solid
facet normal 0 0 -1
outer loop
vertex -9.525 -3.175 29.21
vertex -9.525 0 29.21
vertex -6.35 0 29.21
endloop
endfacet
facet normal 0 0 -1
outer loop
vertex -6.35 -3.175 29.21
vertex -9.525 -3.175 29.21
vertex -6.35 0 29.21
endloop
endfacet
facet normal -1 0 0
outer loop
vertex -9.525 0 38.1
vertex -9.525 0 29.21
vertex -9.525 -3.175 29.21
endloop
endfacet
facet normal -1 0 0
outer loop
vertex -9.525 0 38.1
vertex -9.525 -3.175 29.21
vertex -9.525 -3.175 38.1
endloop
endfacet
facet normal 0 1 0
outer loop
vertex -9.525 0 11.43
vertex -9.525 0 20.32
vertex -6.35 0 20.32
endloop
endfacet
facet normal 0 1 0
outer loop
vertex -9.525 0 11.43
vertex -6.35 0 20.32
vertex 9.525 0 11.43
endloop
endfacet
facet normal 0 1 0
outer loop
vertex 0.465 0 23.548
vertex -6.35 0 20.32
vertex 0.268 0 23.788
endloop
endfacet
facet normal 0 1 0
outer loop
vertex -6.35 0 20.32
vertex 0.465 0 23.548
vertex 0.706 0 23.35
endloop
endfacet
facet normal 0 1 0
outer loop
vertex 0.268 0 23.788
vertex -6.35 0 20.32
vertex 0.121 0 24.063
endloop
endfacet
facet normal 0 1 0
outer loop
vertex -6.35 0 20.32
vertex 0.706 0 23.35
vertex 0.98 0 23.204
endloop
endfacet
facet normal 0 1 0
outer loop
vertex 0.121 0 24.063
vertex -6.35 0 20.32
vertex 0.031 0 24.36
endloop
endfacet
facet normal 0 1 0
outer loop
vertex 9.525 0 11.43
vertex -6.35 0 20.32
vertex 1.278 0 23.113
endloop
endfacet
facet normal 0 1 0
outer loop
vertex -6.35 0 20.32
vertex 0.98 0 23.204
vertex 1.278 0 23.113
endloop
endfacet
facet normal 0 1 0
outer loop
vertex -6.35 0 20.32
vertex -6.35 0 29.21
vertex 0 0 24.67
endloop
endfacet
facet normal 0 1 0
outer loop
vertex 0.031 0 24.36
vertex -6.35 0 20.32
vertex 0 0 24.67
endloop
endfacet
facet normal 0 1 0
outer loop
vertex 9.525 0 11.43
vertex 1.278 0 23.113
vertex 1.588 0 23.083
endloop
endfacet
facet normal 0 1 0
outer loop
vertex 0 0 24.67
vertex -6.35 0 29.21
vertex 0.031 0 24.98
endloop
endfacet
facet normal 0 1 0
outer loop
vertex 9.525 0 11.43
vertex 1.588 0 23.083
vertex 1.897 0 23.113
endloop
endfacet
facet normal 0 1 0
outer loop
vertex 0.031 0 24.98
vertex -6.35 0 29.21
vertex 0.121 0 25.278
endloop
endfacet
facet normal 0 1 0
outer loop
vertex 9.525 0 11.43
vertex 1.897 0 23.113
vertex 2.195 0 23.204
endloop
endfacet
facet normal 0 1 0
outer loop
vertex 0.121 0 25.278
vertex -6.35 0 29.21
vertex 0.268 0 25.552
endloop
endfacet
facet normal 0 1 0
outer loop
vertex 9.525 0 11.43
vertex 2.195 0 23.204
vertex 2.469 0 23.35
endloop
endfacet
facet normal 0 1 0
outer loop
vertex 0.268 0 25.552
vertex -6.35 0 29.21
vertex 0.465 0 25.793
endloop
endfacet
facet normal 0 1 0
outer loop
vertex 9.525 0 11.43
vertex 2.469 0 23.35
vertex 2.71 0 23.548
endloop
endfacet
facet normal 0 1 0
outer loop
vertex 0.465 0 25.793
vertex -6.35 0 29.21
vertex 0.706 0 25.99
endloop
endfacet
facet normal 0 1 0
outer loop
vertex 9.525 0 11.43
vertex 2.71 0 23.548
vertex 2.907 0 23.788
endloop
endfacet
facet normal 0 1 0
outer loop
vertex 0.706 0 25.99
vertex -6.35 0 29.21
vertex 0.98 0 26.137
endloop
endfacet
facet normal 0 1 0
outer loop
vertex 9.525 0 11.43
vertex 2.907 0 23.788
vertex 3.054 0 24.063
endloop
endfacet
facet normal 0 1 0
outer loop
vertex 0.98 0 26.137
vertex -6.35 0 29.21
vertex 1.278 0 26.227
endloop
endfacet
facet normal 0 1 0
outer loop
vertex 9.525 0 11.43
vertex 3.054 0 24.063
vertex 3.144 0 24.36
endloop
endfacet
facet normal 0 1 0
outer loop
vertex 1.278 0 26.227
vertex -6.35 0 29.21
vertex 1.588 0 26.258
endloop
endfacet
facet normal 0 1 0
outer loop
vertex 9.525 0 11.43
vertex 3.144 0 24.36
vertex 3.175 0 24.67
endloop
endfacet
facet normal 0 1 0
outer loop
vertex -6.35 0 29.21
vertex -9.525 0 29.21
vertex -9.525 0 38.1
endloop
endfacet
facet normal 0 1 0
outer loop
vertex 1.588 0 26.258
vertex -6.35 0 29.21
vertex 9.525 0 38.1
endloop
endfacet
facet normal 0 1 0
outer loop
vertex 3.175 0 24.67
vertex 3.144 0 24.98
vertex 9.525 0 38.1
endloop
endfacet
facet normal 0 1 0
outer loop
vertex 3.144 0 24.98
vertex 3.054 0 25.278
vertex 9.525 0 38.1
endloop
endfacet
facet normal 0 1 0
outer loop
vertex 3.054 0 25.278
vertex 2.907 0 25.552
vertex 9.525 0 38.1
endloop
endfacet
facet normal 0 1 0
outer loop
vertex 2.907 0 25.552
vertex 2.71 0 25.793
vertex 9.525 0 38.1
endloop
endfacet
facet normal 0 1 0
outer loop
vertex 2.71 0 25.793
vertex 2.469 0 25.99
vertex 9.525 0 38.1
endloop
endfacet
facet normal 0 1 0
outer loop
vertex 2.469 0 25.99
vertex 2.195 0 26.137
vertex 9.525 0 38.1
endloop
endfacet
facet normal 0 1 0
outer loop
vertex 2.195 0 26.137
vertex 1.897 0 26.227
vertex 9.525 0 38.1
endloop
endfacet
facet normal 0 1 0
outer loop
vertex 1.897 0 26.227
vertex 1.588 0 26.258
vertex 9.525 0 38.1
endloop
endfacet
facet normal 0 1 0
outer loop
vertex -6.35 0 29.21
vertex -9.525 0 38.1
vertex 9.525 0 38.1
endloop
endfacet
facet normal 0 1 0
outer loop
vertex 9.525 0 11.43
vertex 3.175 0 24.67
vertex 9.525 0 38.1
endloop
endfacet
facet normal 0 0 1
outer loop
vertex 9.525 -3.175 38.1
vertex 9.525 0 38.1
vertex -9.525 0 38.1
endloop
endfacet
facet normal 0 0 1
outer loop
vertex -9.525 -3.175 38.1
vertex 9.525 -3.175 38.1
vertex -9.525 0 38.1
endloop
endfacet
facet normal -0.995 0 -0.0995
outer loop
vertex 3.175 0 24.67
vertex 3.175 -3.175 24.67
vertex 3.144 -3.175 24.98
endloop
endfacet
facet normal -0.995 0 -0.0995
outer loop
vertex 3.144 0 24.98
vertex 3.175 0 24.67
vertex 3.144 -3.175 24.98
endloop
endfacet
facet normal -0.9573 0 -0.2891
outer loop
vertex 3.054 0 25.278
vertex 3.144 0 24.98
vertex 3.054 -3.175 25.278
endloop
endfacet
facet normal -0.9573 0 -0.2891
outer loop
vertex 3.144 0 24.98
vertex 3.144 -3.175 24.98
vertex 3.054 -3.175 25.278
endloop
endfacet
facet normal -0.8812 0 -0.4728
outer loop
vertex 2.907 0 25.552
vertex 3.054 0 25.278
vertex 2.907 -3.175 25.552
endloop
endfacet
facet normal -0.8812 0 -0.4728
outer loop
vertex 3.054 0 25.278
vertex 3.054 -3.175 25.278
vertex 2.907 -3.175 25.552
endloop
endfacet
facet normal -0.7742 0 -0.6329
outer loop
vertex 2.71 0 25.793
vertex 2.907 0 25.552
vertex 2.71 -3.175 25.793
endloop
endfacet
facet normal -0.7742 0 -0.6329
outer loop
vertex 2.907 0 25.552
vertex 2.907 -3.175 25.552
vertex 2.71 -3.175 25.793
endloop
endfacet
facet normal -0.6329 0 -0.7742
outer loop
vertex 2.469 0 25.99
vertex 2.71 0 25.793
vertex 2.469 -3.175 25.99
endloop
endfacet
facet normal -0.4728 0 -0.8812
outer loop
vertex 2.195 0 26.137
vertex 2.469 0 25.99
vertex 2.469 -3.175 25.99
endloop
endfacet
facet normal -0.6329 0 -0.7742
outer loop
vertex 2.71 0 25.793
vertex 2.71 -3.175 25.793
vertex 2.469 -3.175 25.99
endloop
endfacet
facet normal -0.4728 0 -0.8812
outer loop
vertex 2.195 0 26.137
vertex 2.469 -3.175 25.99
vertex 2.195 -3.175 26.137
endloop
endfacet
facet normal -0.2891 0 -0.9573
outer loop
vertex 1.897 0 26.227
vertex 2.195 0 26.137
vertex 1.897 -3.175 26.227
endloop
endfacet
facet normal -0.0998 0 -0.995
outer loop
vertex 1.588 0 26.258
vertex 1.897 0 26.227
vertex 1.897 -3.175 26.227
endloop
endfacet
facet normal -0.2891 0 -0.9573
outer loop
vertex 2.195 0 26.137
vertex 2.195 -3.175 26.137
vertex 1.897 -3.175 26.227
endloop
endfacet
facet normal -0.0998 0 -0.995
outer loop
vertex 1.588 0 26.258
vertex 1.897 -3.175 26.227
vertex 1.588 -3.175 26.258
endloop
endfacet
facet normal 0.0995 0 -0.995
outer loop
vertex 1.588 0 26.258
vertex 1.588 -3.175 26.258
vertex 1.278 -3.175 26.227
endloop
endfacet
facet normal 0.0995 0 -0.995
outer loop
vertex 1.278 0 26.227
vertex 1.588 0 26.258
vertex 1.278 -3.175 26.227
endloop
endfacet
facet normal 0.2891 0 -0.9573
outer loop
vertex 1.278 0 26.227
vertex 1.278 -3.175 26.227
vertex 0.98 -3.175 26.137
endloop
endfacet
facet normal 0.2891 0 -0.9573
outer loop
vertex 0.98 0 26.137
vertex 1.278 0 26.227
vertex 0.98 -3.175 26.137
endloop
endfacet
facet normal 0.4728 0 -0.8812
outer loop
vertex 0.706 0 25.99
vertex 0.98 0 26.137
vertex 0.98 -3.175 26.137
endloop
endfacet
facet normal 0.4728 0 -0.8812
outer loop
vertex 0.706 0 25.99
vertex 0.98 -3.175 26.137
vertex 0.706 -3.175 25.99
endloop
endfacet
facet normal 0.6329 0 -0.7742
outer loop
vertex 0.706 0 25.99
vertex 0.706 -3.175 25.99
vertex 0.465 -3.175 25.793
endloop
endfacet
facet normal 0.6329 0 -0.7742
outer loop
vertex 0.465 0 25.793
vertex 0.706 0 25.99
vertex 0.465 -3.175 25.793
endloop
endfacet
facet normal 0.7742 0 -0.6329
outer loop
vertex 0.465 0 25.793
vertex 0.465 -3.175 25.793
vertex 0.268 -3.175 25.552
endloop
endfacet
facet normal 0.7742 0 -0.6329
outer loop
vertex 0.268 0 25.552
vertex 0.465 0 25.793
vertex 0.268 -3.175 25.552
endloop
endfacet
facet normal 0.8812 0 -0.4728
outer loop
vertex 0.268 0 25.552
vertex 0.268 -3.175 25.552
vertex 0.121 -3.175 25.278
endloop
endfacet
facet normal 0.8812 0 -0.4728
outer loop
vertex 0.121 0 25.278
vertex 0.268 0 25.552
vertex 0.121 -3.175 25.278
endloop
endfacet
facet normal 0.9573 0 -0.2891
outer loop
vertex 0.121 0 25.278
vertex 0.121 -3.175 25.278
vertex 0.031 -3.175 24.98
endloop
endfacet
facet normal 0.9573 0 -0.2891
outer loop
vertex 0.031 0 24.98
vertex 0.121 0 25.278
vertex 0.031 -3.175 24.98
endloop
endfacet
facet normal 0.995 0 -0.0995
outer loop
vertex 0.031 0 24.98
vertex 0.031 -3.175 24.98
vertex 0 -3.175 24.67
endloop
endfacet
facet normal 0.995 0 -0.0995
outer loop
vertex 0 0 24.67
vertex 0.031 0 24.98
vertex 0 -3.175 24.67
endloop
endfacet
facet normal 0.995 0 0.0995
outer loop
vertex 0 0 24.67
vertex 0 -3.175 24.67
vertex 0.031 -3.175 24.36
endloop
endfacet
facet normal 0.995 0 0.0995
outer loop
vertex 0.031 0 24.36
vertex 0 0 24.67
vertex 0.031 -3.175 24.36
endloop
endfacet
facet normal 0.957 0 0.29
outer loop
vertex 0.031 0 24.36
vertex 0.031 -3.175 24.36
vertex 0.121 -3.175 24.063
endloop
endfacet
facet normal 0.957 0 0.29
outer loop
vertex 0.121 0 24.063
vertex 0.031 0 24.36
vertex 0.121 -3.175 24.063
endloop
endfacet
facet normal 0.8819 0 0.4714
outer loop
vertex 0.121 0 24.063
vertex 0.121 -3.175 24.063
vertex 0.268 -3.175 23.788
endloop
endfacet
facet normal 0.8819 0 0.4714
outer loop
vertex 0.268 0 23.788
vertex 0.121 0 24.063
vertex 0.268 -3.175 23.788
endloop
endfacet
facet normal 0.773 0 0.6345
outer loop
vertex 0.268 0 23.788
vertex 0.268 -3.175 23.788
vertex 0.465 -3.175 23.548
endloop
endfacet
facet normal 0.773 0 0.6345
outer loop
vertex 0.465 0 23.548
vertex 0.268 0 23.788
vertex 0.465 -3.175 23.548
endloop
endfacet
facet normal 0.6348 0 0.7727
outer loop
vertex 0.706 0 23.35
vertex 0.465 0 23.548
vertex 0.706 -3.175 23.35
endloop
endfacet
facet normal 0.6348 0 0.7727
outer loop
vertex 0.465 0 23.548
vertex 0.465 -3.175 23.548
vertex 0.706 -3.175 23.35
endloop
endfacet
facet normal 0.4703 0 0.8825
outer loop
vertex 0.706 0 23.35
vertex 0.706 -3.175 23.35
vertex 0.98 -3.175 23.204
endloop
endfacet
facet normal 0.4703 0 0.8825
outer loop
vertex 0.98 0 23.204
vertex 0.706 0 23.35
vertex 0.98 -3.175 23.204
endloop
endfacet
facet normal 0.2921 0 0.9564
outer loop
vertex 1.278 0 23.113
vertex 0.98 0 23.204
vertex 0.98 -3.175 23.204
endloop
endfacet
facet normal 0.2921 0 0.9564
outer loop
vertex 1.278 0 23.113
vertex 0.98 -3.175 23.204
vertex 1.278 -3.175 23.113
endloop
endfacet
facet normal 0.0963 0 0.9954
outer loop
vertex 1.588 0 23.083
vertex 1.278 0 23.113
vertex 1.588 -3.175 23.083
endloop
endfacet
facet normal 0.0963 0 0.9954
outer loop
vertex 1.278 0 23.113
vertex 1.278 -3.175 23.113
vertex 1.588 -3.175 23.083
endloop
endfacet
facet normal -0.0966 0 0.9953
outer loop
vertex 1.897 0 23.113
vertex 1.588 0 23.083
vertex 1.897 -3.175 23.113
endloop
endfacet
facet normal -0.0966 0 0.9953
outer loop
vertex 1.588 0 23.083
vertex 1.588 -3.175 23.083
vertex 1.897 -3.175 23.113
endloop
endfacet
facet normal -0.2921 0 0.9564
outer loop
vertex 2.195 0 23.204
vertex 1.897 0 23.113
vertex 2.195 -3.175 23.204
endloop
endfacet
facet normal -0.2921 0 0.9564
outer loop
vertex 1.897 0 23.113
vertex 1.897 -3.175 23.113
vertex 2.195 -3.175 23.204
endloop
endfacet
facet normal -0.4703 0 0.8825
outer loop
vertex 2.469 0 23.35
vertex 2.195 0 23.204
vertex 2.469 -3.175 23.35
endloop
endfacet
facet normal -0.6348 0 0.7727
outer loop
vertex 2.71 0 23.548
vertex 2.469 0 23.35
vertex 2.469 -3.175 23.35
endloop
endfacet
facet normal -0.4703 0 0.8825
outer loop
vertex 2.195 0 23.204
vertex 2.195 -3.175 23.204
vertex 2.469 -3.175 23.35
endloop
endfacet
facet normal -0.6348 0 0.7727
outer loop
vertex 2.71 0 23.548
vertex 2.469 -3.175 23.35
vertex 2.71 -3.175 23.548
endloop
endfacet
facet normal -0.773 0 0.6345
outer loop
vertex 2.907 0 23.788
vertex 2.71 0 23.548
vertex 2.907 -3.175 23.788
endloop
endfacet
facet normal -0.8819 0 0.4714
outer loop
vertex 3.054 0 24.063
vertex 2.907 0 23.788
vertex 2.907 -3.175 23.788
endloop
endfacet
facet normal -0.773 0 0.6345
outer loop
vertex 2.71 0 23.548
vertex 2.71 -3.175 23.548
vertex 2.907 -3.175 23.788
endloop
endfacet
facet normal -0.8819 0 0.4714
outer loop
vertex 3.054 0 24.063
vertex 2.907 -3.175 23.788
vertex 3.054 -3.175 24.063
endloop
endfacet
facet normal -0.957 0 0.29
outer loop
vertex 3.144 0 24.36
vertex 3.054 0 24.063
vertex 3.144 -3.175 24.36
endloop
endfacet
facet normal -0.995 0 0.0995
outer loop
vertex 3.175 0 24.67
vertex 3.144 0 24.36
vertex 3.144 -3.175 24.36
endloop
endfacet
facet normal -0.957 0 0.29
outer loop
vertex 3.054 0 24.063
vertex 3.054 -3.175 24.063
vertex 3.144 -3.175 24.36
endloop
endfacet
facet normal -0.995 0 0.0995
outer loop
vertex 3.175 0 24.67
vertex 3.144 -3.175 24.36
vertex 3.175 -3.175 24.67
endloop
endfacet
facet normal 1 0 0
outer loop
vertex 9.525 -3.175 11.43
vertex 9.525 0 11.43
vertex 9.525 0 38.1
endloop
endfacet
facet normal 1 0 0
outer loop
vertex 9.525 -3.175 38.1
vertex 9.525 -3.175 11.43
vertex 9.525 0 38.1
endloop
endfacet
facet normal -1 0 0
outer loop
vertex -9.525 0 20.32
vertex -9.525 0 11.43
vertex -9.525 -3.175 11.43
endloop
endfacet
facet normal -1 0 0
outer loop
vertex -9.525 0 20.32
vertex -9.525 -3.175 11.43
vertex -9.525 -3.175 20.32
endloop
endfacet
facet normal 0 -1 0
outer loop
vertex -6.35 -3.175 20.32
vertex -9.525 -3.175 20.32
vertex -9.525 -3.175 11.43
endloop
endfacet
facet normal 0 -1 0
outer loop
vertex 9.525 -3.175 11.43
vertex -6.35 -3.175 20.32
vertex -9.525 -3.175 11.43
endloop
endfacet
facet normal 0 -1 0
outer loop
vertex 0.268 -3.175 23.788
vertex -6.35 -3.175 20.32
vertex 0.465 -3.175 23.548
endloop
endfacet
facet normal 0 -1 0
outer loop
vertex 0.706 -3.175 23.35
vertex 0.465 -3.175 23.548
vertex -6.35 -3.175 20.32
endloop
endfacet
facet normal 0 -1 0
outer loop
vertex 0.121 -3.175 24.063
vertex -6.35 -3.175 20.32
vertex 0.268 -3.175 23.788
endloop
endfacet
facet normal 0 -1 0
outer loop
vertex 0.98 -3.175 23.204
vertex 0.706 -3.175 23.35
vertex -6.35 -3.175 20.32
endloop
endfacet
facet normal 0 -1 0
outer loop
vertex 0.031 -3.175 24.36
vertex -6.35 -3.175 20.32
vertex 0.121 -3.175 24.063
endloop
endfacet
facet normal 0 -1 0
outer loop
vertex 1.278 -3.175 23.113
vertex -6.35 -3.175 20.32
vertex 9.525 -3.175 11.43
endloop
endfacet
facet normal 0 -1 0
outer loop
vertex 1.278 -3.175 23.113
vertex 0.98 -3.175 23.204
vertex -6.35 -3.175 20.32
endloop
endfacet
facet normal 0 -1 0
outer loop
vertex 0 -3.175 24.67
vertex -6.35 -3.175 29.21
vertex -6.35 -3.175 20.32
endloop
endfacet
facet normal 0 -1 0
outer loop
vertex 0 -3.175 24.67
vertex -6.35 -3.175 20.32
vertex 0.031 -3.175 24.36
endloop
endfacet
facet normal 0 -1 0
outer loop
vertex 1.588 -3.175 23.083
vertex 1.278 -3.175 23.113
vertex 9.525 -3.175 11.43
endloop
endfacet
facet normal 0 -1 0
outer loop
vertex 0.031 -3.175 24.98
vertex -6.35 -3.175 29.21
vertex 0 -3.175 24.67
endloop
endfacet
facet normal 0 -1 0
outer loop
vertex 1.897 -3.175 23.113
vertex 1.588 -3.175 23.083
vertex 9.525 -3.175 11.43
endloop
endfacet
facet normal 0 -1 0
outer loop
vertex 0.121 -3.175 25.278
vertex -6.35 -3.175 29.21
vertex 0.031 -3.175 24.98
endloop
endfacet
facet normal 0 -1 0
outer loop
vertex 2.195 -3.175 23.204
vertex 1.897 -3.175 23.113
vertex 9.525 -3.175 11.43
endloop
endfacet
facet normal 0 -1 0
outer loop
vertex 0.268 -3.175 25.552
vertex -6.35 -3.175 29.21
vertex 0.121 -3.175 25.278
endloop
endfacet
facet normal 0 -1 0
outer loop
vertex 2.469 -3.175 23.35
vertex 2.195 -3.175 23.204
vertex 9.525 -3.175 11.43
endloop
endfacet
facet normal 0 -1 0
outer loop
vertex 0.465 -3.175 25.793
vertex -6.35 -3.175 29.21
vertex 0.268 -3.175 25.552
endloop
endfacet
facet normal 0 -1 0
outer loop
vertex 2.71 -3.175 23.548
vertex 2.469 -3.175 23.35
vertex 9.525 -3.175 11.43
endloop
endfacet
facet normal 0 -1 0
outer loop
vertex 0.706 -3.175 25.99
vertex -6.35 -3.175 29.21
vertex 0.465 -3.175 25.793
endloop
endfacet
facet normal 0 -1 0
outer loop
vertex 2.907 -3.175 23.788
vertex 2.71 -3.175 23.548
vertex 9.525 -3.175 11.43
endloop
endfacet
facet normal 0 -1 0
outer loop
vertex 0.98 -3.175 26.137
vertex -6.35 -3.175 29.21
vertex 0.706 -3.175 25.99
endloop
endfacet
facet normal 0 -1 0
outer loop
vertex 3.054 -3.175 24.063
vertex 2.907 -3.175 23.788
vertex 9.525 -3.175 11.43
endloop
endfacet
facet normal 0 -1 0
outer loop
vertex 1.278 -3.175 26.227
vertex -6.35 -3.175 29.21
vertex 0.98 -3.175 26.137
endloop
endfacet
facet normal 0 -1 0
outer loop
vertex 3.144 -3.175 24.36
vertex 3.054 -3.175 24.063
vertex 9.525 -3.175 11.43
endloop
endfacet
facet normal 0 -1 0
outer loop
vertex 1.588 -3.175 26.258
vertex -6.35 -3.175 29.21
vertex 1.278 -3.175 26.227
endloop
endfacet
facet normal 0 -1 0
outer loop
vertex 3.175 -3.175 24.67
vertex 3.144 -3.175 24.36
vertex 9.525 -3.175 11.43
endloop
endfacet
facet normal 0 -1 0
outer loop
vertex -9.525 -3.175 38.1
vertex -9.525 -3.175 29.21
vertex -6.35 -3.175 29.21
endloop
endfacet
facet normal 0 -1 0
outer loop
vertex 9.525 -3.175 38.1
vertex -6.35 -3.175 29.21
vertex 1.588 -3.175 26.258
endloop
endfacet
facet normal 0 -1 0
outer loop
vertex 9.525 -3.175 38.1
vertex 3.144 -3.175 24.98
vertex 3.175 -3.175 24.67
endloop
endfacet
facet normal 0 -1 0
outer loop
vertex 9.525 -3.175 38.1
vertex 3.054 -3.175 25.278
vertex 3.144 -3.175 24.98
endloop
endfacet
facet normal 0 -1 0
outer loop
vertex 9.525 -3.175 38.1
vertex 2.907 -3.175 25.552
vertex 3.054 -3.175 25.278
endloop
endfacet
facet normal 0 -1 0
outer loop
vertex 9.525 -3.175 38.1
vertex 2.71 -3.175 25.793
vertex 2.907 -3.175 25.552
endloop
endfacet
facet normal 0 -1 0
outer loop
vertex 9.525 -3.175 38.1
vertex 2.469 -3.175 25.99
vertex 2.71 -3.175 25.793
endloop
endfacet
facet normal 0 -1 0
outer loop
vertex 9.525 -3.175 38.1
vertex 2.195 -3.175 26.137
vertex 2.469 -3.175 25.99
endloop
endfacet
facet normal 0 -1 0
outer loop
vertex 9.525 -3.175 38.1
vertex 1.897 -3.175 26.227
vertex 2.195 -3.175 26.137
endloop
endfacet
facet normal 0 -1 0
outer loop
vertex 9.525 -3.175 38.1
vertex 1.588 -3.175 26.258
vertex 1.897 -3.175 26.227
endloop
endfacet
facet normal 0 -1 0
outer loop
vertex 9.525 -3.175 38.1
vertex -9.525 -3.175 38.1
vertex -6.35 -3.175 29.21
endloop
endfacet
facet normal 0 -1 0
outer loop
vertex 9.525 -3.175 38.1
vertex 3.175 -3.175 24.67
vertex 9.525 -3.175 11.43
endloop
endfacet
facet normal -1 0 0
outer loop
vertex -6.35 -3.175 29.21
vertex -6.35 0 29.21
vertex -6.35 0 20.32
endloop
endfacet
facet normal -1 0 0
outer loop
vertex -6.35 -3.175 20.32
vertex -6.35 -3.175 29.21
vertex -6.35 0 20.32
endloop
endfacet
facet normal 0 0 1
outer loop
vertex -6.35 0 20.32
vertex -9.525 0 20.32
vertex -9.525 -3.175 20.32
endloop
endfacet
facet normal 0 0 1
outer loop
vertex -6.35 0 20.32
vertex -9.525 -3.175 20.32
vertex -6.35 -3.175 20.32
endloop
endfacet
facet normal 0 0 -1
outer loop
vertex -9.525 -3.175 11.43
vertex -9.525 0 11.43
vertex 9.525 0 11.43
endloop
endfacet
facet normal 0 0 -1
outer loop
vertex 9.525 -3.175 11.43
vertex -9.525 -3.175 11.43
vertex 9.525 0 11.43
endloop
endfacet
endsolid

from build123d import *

# Parameters (mm, degrees)
F0_W     = 3.175
F0_H     = 8.89
F1_DEPTH = 3.175
F2_R     = 1.5875
F3_DEPTH = 3.176


# Not quite as in the source:
# - a feature names something its author has since deleted; it is built from what else it names


with BuildPart() as f1:
    # F0 (on Front) → F1 (new body)
    with BuildSketch(Plane.XZ):
        Polygon((9.525, 11.43), (9.525, 38.1), (-6.35, 38.1), (-6.35, 29.21), (-6.35, 20.32), (-6.35, 11.43), align=None)
        with Locations((-7.9375, 33.655)):
            Rectangle(F0_W, F0_H)
        with Locations((-7.9375, 15.875)):
            Rectangle(F0_W, F0_H)
    extrude(amount=F1_DEPTH)

    # F2 (on face) → F3 (cut, through all)
    with BuildSketch(Plane.XZ.offset(3.175)):
        with Locations((1.5875, 24.6701687584)):
            Circle(F2_R)
    extrude(amount=-F3_DEPTH, mode=Mode.SUBTRACT)


solid = f1.part
